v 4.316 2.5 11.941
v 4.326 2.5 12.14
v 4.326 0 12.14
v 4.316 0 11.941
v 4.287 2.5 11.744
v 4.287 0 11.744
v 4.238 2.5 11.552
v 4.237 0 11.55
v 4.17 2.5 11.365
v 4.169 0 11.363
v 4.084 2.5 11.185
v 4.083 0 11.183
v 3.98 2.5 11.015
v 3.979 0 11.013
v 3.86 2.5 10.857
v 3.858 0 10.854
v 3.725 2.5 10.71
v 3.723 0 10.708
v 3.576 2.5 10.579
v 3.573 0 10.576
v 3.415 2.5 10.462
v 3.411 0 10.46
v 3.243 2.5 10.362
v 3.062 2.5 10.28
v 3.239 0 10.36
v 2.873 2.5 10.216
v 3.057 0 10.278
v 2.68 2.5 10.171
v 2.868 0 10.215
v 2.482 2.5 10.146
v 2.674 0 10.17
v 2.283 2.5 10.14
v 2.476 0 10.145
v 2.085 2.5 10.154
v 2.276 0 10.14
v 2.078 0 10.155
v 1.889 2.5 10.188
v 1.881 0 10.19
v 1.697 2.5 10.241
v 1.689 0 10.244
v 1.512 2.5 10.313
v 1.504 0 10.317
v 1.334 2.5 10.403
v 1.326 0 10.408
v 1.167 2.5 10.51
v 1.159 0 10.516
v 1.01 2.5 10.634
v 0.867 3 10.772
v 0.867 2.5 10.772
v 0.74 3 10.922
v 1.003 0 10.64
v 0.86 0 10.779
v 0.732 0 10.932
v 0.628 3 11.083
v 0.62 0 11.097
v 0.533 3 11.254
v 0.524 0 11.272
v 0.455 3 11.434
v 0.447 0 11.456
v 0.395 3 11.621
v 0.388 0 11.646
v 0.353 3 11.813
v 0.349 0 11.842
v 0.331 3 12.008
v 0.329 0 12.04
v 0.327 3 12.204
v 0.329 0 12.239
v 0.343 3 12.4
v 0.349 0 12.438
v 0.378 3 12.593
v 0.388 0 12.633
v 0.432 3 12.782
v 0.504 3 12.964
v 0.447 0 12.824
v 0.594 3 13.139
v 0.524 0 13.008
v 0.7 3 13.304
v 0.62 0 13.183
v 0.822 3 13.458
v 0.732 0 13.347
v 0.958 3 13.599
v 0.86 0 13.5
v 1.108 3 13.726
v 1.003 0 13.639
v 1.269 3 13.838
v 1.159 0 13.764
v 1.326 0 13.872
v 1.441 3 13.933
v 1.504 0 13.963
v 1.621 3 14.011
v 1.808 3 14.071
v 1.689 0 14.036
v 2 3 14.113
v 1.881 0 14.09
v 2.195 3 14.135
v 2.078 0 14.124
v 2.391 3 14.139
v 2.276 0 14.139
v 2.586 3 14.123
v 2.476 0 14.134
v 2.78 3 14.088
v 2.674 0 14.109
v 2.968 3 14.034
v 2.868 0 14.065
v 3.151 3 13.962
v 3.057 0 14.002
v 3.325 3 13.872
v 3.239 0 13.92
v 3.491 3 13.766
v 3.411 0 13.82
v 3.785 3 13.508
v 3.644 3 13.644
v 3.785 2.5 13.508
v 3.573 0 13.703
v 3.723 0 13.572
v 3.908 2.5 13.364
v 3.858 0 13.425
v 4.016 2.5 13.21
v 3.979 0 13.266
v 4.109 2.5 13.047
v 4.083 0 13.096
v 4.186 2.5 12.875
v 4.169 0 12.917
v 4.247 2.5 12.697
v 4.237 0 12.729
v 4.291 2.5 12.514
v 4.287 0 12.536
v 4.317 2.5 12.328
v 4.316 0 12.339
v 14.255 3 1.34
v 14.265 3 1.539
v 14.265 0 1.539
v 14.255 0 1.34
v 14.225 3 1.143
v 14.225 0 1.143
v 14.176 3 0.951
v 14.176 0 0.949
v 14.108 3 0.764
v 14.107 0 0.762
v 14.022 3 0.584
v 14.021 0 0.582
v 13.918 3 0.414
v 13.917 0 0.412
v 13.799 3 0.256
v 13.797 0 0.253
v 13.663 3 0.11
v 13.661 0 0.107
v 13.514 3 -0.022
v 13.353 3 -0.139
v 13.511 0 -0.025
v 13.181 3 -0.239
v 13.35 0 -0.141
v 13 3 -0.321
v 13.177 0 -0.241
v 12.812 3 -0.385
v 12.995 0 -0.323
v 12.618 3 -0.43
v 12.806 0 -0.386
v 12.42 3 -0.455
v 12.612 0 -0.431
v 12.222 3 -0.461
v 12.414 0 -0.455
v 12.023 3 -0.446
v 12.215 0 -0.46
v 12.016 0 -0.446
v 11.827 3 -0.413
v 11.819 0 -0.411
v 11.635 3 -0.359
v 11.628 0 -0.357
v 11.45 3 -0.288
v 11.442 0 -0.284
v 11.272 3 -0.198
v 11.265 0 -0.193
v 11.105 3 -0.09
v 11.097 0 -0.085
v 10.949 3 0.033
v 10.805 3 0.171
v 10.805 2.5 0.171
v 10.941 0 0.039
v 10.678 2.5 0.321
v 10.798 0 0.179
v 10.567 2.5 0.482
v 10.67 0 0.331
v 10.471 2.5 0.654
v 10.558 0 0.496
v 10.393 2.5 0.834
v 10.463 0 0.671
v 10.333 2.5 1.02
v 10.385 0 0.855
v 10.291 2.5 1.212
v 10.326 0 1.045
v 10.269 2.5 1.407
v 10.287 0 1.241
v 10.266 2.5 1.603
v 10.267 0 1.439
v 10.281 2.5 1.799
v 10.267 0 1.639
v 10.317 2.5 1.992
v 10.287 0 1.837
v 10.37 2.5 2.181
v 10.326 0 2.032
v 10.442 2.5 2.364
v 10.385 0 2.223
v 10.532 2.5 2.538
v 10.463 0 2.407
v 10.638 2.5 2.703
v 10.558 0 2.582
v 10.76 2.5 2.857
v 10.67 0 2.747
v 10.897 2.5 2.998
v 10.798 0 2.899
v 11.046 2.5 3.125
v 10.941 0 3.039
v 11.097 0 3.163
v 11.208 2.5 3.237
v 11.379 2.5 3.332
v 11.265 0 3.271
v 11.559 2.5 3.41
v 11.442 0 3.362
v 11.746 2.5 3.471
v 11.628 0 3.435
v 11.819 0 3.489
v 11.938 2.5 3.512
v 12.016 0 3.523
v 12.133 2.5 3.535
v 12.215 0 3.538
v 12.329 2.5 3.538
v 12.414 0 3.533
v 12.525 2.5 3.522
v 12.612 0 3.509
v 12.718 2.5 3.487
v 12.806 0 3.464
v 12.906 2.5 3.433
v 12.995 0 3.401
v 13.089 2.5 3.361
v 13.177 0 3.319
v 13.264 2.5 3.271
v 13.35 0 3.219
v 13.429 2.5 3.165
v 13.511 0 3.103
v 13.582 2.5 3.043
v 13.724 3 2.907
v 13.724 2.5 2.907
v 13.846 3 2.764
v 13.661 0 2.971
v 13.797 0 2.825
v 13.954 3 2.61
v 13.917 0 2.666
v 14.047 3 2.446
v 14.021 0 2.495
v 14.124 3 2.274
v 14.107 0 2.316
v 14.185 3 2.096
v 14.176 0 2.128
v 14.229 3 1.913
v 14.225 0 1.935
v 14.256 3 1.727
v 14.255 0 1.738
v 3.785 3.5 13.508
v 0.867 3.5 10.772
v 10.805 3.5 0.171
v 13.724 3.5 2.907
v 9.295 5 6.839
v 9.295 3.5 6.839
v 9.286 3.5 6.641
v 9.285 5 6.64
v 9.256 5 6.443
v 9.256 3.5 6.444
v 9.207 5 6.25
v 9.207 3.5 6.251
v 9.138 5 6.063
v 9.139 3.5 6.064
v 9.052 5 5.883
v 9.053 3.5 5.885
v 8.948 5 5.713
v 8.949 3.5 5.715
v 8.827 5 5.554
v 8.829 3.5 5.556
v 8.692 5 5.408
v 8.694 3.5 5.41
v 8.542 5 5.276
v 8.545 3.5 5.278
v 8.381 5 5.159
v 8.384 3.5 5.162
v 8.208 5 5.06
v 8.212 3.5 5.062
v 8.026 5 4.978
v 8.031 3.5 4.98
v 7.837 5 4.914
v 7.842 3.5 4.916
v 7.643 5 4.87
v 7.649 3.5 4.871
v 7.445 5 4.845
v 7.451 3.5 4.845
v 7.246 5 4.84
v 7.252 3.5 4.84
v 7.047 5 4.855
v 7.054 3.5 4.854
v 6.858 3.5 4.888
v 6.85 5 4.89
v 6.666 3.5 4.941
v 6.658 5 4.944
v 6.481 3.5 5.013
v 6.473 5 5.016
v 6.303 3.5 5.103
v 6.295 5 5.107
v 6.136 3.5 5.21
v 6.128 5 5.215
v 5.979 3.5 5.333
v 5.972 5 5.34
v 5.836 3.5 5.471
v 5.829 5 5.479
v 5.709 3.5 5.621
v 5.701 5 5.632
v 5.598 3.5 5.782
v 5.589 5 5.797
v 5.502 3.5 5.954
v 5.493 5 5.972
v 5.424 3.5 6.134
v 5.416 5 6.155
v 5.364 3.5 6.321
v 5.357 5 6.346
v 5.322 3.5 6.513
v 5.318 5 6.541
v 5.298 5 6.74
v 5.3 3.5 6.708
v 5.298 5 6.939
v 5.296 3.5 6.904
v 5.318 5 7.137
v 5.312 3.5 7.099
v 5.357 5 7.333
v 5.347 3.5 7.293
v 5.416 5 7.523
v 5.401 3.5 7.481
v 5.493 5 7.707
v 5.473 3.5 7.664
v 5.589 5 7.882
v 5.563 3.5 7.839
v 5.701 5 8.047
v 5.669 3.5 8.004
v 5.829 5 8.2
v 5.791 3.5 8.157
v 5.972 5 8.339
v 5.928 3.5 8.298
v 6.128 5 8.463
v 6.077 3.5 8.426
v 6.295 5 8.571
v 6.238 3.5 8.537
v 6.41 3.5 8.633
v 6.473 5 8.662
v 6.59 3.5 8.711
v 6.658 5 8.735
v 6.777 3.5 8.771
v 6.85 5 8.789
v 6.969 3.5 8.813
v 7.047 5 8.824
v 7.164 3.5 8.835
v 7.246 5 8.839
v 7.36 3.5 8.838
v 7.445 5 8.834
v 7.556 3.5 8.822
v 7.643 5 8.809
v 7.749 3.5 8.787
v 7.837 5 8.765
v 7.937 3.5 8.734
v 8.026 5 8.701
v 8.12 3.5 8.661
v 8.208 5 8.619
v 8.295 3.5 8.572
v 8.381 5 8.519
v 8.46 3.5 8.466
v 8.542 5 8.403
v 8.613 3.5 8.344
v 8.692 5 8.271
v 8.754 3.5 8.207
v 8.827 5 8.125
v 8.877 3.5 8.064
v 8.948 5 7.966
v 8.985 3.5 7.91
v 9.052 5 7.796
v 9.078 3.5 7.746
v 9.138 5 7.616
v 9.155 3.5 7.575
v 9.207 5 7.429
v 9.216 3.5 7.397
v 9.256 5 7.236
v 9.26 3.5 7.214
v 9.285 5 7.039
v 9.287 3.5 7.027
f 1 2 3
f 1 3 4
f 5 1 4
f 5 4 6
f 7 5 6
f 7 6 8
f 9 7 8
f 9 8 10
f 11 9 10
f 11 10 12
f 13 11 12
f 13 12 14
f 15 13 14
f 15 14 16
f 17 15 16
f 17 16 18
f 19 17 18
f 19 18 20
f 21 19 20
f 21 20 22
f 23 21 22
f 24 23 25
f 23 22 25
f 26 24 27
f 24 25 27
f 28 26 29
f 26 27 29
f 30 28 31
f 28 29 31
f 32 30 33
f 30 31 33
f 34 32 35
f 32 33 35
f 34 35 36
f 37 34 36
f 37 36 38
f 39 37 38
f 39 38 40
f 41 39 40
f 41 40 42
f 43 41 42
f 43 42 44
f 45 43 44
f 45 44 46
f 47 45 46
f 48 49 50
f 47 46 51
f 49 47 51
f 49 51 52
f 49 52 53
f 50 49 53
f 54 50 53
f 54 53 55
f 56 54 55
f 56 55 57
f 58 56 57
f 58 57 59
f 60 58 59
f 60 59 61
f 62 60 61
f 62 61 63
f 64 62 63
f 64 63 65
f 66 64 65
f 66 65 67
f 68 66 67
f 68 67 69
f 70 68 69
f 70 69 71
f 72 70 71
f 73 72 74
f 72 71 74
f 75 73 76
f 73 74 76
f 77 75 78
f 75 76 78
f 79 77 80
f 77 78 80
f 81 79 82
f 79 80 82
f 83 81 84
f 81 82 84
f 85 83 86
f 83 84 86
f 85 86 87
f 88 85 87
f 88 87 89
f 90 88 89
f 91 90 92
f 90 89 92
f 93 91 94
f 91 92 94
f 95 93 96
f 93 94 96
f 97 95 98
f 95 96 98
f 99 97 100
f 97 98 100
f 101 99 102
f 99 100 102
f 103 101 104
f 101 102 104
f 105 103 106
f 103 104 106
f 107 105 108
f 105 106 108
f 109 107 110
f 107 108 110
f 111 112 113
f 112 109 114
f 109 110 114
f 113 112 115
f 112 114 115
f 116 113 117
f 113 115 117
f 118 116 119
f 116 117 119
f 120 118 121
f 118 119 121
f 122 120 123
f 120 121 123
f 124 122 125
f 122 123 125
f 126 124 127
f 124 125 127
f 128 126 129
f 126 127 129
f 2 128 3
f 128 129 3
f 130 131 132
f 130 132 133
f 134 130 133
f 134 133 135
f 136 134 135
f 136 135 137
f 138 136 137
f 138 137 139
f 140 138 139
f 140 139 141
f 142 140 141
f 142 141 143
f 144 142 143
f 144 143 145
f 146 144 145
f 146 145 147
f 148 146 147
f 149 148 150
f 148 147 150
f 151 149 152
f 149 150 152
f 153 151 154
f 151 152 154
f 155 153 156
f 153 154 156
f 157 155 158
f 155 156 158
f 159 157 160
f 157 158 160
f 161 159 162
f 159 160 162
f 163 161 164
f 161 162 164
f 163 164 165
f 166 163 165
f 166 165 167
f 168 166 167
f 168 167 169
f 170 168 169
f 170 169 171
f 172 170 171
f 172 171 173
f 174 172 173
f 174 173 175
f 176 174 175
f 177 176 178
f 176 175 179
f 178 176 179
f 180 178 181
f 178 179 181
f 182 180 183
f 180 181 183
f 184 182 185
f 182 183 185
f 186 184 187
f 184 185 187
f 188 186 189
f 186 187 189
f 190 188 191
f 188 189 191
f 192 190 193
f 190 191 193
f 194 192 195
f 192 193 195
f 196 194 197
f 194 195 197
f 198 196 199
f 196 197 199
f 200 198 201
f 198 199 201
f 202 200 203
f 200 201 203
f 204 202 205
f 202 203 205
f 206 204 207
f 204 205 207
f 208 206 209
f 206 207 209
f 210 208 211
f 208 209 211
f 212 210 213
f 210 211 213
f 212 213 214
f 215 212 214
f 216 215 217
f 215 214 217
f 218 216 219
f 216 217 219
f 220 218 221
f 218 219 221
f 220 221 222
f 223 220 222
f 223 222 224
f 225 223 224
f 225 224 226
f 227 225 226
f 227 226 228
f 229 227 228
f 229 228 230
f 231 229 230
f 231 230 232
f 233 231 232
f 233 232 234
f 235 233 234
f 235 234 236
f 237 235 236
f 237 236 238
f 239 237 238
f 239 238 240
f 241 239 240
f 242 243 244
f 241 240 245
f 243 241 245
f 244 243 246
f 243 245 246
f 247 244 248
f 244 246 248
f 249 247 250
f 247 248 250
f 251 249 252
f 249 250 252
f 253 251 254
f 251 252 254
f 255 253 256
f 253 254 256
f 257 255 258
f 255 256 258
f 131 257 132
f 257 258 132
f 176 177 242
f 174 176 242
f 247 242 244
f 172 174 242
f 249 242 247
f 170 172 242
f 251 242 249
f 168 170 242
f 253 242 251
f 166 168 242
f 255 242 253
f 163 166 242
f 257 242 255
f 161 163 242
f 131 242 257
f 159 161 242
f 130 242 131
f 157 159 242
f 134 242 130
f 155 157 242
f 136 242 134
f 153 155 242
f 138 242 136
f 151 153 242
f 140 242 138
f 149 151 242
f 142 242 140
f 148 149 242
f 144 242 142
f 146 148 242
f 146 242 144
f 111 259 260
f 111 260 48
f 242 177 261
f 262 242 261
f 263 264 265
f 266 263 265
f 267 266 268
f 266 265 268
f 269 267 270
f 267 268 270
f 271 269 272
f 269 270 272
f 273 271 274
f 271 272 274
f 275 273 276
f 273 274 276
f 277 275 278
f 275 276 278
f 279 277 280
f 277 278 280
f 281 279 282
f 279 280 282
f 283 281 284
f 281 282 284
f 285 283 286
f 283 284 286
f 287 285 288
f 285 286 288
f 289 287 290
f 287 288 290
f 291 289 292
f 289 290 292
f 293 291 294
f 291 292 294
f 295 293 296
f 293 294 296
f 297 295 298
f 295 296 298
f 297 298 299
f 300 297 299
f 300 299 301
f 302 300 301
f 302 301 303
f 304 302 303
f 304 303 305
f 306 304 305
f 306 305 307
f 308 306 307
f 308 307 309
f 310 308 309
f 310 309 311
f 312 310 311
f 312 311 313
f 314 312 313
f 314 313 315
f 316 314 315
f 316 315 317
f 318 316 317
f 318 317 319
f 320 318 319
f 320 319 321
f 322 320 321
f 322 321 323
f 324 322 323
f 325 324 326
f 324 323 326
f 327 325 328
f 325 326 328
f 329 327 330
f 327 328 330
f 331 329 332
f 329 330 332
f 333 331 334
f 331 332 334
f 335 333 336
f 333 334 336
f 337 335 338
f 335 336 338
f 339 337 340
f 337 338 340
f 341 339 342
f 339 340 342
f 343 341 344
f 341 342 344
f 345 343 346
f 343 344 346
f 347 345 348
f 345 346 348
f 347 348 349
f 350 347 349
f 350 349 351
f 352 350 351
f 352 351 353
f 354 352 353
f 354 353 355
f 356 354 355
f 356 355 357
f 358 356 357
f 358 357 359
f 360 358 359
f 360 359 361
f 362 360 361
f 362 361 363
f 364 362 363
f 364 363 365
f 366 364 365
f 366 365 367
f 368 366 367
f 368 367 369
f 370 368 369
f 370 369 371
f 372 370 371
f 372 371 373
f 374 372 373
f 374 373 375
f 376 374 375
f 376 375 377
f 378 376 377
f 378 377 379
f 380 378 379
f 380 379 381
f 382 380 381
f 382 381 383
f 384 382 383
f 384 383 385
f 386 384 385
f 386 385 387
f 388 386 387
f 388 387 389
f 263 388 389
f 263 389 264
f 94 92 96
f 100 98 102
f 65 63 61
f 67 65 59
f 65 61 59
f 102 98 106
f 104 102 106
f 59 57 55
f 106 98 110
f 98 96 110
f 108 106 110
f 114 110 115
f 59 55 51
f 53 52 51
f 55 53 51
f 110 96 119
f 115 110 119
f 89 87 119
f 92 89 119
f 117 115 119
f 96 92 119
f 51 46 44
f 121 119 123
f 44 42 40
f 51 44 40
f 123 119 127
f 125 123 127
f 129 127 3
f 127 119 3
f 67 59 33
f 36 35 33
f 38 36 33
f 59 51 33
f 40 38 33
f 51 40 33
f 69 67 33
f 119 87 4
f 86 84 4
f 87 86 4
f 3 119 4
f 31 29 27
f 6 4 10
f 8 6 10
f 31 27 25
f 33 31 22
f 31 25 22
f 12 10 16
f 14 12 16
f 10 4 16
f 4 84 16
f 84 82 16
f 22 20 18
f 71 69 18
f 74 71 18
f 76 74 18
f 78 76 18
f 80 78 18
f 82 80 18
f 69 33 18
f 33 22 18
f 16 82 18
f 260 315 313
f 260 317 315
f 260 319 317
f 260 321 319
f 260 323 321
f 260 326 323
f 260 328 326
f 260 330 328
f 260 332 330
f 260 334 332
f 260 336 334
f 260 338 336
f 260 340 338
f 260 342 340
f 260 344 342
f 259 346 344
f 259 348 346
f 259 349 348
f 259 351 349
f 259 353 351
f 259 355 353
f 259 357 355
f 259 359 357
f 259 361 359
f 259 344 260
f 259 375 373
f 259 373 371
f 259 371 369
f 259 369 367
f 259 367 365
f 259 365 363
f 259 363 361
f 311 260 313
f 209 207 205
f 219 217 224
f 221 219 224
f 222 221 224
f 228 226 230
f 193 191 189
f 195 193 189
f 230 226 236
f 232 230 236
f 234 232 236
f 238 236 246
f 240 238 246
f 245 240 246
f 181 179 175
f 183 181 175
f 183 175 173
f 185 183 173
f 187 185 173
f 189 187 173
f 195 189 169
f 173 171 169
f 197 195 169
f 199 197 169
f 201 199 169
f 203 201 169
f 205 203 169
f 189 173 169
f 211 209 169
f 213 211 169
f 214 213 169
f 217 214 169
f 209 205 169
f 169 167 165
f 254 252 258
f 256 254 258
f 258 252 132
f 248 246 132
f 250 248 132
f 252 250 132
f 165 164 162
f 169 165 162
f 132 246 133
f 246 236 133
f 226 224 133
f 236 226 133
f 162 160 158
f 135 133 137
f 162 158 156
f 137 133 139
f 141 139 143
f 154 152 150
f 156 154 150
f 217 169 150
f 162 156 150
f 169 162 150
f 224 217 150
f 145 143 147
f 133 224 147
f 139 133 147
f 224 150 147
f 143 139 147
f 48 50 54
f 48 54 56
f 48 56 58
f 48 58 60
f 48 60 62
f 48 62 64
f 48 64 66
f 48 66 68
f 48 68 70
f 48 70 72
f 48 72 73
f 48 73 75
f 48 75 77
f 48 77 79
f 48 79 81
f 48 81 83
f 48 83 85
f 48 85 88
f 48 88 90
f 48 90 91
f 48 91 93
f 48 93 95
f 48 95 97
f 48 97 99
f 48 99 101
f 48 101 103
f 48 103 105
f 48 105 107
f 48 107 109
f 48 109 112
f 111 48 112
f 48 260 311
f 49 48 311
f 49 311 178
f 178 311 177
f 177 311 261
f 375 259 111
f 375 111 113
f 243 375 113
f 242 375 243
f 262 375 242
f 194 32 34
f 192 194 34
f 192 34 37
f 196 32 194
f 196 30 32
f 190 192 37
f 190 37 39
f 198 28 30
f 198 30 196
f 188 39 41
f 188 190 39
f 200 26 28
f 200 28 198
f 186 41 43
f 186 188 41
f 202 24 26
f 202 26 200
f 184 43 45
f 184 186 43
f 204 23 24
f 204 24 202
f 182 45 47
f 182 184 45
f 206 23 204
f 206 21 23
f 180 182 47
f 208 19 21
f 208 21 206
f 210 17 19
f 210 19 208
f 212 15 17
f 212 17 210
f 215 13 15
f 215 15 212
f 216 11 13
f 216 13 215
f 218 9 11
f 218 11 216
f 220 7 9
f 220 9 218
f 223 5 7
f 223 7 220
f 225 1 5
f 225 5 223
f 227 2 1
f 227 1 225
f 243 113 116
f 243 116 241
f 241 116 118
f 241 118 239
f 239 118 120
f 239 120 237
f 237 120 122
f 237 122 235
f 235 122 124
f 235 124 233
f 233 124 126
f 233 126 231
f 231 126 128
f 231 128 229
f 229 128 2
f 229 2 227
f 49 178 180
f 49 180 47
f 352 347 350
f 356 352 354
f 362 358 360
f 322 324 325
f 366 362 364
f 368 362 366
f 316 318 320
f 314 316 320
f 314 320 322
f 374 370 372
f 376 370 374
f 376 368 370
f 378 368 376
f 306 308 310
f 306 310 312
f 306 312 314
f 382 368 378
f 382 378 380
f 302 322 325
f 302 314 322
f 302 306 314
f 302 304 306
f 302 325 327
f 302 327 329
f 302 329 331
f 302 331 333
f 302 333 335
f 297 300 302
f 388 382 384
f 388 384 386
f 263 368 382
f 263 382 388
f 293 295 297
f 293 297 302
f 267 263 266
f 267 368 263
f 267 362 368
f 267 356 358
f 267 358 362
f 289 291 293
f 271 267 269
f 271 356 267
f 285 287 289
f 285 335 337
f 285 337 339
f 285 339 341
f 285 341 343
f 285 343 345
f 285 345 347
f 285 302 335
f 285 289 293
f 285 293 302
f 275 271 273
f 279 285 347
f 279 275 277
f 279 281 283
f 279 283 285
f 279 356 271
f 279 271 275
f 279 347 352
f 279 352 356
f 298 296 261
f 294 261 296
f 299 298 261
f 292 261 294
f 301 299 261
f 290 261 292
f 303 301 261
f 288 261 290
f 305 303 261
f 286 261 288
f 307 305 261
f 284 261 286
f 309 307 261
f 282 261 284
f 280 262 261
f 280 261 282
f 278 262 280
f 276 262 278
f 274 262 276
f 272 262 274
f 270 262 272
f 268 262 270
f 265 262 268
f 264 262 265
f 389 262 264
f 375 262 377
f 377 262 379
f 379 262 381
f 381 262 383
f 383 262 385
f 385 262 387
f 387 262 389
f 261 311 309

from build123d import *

# Parameters (mm, degrees)
SKETCH1_R             = 2
BOSS_EXTRUDE1_DEPTH   = 3
BOSS_EXTRUDE1_2_DEPTH = 3
BOSS_EXTRUDE2_DEPTH   = 4
SKETCH4_R             = 2
BOSS_EXTRUDE3_DEPTH   = 1.5


with BuildPart() as part:
    # Sketch1 → Boss-Extrude1 (new body)
    with BuildSketch(Plane(origin=(0, 0, 0), x_dir=(1, 0, 0), z_dir=(0, 1, 0))):
        with Locations((2.326314278, -12.139796801)):
            Circle(SKETCH1_R)
    extrude(amount=BOSS_EXTRUDE1_DEPTH)



with BuildPart() as body_2:
    # Sketch1 → Boss-Extrude1 2 (new body)
    with BuildSketch(Plane(origin=(0, 0, 0), x_dir=(1, 0, 0), z_dir=(0, 1, 0))):
        with Locations((12.264503501, -1.538947167)):
            Circle(SKETCH1_R)
    extrude(amount=BOSS_EXTRUDE1_2_DEPTH)


with BuildPart() as part_1:
    add(part.part)

    add(body_2.part)  # Boss-Extrude2 merges body 2
    # Sketch2 → Boss-Extrude2 (add)
    with BuildSketch(Plane(origin=(8.754490667, 0, 8.207246381), x_dir=(0.683937198, 0, -0.729540889), z_dir=(0.729540889, 0, 0.683937198))):
        Polygon((5.26542528, 3), (7.26542528, 3), (7.26542528, 3.5), (-7.26542528, 3.5), (-7.26542528, 3), align=None)
        Polygon((7.26542528, 2.5), (7.26542528, 3), (5.26542528, 3), (-7.26542528, 3), (-7.26542528, 2.5), align=None)
    extrude(amount=-BOSS_EXTRUDE2_DEPTH)

    # Sketch4 → Boss-Extrude3 (add)
    with BuildSketch(Plane(origin=(0, 3.5, 0), x_dir=(1, 0, 0), z_dir=(0, 1, 0))):
        with Locations((7.295408889, -6.839371984)):
            Circle(SKETCH4_R)
    extrude(amount=BOSS_EXTRUDE3_DEPTH)


solid = part_1.part
